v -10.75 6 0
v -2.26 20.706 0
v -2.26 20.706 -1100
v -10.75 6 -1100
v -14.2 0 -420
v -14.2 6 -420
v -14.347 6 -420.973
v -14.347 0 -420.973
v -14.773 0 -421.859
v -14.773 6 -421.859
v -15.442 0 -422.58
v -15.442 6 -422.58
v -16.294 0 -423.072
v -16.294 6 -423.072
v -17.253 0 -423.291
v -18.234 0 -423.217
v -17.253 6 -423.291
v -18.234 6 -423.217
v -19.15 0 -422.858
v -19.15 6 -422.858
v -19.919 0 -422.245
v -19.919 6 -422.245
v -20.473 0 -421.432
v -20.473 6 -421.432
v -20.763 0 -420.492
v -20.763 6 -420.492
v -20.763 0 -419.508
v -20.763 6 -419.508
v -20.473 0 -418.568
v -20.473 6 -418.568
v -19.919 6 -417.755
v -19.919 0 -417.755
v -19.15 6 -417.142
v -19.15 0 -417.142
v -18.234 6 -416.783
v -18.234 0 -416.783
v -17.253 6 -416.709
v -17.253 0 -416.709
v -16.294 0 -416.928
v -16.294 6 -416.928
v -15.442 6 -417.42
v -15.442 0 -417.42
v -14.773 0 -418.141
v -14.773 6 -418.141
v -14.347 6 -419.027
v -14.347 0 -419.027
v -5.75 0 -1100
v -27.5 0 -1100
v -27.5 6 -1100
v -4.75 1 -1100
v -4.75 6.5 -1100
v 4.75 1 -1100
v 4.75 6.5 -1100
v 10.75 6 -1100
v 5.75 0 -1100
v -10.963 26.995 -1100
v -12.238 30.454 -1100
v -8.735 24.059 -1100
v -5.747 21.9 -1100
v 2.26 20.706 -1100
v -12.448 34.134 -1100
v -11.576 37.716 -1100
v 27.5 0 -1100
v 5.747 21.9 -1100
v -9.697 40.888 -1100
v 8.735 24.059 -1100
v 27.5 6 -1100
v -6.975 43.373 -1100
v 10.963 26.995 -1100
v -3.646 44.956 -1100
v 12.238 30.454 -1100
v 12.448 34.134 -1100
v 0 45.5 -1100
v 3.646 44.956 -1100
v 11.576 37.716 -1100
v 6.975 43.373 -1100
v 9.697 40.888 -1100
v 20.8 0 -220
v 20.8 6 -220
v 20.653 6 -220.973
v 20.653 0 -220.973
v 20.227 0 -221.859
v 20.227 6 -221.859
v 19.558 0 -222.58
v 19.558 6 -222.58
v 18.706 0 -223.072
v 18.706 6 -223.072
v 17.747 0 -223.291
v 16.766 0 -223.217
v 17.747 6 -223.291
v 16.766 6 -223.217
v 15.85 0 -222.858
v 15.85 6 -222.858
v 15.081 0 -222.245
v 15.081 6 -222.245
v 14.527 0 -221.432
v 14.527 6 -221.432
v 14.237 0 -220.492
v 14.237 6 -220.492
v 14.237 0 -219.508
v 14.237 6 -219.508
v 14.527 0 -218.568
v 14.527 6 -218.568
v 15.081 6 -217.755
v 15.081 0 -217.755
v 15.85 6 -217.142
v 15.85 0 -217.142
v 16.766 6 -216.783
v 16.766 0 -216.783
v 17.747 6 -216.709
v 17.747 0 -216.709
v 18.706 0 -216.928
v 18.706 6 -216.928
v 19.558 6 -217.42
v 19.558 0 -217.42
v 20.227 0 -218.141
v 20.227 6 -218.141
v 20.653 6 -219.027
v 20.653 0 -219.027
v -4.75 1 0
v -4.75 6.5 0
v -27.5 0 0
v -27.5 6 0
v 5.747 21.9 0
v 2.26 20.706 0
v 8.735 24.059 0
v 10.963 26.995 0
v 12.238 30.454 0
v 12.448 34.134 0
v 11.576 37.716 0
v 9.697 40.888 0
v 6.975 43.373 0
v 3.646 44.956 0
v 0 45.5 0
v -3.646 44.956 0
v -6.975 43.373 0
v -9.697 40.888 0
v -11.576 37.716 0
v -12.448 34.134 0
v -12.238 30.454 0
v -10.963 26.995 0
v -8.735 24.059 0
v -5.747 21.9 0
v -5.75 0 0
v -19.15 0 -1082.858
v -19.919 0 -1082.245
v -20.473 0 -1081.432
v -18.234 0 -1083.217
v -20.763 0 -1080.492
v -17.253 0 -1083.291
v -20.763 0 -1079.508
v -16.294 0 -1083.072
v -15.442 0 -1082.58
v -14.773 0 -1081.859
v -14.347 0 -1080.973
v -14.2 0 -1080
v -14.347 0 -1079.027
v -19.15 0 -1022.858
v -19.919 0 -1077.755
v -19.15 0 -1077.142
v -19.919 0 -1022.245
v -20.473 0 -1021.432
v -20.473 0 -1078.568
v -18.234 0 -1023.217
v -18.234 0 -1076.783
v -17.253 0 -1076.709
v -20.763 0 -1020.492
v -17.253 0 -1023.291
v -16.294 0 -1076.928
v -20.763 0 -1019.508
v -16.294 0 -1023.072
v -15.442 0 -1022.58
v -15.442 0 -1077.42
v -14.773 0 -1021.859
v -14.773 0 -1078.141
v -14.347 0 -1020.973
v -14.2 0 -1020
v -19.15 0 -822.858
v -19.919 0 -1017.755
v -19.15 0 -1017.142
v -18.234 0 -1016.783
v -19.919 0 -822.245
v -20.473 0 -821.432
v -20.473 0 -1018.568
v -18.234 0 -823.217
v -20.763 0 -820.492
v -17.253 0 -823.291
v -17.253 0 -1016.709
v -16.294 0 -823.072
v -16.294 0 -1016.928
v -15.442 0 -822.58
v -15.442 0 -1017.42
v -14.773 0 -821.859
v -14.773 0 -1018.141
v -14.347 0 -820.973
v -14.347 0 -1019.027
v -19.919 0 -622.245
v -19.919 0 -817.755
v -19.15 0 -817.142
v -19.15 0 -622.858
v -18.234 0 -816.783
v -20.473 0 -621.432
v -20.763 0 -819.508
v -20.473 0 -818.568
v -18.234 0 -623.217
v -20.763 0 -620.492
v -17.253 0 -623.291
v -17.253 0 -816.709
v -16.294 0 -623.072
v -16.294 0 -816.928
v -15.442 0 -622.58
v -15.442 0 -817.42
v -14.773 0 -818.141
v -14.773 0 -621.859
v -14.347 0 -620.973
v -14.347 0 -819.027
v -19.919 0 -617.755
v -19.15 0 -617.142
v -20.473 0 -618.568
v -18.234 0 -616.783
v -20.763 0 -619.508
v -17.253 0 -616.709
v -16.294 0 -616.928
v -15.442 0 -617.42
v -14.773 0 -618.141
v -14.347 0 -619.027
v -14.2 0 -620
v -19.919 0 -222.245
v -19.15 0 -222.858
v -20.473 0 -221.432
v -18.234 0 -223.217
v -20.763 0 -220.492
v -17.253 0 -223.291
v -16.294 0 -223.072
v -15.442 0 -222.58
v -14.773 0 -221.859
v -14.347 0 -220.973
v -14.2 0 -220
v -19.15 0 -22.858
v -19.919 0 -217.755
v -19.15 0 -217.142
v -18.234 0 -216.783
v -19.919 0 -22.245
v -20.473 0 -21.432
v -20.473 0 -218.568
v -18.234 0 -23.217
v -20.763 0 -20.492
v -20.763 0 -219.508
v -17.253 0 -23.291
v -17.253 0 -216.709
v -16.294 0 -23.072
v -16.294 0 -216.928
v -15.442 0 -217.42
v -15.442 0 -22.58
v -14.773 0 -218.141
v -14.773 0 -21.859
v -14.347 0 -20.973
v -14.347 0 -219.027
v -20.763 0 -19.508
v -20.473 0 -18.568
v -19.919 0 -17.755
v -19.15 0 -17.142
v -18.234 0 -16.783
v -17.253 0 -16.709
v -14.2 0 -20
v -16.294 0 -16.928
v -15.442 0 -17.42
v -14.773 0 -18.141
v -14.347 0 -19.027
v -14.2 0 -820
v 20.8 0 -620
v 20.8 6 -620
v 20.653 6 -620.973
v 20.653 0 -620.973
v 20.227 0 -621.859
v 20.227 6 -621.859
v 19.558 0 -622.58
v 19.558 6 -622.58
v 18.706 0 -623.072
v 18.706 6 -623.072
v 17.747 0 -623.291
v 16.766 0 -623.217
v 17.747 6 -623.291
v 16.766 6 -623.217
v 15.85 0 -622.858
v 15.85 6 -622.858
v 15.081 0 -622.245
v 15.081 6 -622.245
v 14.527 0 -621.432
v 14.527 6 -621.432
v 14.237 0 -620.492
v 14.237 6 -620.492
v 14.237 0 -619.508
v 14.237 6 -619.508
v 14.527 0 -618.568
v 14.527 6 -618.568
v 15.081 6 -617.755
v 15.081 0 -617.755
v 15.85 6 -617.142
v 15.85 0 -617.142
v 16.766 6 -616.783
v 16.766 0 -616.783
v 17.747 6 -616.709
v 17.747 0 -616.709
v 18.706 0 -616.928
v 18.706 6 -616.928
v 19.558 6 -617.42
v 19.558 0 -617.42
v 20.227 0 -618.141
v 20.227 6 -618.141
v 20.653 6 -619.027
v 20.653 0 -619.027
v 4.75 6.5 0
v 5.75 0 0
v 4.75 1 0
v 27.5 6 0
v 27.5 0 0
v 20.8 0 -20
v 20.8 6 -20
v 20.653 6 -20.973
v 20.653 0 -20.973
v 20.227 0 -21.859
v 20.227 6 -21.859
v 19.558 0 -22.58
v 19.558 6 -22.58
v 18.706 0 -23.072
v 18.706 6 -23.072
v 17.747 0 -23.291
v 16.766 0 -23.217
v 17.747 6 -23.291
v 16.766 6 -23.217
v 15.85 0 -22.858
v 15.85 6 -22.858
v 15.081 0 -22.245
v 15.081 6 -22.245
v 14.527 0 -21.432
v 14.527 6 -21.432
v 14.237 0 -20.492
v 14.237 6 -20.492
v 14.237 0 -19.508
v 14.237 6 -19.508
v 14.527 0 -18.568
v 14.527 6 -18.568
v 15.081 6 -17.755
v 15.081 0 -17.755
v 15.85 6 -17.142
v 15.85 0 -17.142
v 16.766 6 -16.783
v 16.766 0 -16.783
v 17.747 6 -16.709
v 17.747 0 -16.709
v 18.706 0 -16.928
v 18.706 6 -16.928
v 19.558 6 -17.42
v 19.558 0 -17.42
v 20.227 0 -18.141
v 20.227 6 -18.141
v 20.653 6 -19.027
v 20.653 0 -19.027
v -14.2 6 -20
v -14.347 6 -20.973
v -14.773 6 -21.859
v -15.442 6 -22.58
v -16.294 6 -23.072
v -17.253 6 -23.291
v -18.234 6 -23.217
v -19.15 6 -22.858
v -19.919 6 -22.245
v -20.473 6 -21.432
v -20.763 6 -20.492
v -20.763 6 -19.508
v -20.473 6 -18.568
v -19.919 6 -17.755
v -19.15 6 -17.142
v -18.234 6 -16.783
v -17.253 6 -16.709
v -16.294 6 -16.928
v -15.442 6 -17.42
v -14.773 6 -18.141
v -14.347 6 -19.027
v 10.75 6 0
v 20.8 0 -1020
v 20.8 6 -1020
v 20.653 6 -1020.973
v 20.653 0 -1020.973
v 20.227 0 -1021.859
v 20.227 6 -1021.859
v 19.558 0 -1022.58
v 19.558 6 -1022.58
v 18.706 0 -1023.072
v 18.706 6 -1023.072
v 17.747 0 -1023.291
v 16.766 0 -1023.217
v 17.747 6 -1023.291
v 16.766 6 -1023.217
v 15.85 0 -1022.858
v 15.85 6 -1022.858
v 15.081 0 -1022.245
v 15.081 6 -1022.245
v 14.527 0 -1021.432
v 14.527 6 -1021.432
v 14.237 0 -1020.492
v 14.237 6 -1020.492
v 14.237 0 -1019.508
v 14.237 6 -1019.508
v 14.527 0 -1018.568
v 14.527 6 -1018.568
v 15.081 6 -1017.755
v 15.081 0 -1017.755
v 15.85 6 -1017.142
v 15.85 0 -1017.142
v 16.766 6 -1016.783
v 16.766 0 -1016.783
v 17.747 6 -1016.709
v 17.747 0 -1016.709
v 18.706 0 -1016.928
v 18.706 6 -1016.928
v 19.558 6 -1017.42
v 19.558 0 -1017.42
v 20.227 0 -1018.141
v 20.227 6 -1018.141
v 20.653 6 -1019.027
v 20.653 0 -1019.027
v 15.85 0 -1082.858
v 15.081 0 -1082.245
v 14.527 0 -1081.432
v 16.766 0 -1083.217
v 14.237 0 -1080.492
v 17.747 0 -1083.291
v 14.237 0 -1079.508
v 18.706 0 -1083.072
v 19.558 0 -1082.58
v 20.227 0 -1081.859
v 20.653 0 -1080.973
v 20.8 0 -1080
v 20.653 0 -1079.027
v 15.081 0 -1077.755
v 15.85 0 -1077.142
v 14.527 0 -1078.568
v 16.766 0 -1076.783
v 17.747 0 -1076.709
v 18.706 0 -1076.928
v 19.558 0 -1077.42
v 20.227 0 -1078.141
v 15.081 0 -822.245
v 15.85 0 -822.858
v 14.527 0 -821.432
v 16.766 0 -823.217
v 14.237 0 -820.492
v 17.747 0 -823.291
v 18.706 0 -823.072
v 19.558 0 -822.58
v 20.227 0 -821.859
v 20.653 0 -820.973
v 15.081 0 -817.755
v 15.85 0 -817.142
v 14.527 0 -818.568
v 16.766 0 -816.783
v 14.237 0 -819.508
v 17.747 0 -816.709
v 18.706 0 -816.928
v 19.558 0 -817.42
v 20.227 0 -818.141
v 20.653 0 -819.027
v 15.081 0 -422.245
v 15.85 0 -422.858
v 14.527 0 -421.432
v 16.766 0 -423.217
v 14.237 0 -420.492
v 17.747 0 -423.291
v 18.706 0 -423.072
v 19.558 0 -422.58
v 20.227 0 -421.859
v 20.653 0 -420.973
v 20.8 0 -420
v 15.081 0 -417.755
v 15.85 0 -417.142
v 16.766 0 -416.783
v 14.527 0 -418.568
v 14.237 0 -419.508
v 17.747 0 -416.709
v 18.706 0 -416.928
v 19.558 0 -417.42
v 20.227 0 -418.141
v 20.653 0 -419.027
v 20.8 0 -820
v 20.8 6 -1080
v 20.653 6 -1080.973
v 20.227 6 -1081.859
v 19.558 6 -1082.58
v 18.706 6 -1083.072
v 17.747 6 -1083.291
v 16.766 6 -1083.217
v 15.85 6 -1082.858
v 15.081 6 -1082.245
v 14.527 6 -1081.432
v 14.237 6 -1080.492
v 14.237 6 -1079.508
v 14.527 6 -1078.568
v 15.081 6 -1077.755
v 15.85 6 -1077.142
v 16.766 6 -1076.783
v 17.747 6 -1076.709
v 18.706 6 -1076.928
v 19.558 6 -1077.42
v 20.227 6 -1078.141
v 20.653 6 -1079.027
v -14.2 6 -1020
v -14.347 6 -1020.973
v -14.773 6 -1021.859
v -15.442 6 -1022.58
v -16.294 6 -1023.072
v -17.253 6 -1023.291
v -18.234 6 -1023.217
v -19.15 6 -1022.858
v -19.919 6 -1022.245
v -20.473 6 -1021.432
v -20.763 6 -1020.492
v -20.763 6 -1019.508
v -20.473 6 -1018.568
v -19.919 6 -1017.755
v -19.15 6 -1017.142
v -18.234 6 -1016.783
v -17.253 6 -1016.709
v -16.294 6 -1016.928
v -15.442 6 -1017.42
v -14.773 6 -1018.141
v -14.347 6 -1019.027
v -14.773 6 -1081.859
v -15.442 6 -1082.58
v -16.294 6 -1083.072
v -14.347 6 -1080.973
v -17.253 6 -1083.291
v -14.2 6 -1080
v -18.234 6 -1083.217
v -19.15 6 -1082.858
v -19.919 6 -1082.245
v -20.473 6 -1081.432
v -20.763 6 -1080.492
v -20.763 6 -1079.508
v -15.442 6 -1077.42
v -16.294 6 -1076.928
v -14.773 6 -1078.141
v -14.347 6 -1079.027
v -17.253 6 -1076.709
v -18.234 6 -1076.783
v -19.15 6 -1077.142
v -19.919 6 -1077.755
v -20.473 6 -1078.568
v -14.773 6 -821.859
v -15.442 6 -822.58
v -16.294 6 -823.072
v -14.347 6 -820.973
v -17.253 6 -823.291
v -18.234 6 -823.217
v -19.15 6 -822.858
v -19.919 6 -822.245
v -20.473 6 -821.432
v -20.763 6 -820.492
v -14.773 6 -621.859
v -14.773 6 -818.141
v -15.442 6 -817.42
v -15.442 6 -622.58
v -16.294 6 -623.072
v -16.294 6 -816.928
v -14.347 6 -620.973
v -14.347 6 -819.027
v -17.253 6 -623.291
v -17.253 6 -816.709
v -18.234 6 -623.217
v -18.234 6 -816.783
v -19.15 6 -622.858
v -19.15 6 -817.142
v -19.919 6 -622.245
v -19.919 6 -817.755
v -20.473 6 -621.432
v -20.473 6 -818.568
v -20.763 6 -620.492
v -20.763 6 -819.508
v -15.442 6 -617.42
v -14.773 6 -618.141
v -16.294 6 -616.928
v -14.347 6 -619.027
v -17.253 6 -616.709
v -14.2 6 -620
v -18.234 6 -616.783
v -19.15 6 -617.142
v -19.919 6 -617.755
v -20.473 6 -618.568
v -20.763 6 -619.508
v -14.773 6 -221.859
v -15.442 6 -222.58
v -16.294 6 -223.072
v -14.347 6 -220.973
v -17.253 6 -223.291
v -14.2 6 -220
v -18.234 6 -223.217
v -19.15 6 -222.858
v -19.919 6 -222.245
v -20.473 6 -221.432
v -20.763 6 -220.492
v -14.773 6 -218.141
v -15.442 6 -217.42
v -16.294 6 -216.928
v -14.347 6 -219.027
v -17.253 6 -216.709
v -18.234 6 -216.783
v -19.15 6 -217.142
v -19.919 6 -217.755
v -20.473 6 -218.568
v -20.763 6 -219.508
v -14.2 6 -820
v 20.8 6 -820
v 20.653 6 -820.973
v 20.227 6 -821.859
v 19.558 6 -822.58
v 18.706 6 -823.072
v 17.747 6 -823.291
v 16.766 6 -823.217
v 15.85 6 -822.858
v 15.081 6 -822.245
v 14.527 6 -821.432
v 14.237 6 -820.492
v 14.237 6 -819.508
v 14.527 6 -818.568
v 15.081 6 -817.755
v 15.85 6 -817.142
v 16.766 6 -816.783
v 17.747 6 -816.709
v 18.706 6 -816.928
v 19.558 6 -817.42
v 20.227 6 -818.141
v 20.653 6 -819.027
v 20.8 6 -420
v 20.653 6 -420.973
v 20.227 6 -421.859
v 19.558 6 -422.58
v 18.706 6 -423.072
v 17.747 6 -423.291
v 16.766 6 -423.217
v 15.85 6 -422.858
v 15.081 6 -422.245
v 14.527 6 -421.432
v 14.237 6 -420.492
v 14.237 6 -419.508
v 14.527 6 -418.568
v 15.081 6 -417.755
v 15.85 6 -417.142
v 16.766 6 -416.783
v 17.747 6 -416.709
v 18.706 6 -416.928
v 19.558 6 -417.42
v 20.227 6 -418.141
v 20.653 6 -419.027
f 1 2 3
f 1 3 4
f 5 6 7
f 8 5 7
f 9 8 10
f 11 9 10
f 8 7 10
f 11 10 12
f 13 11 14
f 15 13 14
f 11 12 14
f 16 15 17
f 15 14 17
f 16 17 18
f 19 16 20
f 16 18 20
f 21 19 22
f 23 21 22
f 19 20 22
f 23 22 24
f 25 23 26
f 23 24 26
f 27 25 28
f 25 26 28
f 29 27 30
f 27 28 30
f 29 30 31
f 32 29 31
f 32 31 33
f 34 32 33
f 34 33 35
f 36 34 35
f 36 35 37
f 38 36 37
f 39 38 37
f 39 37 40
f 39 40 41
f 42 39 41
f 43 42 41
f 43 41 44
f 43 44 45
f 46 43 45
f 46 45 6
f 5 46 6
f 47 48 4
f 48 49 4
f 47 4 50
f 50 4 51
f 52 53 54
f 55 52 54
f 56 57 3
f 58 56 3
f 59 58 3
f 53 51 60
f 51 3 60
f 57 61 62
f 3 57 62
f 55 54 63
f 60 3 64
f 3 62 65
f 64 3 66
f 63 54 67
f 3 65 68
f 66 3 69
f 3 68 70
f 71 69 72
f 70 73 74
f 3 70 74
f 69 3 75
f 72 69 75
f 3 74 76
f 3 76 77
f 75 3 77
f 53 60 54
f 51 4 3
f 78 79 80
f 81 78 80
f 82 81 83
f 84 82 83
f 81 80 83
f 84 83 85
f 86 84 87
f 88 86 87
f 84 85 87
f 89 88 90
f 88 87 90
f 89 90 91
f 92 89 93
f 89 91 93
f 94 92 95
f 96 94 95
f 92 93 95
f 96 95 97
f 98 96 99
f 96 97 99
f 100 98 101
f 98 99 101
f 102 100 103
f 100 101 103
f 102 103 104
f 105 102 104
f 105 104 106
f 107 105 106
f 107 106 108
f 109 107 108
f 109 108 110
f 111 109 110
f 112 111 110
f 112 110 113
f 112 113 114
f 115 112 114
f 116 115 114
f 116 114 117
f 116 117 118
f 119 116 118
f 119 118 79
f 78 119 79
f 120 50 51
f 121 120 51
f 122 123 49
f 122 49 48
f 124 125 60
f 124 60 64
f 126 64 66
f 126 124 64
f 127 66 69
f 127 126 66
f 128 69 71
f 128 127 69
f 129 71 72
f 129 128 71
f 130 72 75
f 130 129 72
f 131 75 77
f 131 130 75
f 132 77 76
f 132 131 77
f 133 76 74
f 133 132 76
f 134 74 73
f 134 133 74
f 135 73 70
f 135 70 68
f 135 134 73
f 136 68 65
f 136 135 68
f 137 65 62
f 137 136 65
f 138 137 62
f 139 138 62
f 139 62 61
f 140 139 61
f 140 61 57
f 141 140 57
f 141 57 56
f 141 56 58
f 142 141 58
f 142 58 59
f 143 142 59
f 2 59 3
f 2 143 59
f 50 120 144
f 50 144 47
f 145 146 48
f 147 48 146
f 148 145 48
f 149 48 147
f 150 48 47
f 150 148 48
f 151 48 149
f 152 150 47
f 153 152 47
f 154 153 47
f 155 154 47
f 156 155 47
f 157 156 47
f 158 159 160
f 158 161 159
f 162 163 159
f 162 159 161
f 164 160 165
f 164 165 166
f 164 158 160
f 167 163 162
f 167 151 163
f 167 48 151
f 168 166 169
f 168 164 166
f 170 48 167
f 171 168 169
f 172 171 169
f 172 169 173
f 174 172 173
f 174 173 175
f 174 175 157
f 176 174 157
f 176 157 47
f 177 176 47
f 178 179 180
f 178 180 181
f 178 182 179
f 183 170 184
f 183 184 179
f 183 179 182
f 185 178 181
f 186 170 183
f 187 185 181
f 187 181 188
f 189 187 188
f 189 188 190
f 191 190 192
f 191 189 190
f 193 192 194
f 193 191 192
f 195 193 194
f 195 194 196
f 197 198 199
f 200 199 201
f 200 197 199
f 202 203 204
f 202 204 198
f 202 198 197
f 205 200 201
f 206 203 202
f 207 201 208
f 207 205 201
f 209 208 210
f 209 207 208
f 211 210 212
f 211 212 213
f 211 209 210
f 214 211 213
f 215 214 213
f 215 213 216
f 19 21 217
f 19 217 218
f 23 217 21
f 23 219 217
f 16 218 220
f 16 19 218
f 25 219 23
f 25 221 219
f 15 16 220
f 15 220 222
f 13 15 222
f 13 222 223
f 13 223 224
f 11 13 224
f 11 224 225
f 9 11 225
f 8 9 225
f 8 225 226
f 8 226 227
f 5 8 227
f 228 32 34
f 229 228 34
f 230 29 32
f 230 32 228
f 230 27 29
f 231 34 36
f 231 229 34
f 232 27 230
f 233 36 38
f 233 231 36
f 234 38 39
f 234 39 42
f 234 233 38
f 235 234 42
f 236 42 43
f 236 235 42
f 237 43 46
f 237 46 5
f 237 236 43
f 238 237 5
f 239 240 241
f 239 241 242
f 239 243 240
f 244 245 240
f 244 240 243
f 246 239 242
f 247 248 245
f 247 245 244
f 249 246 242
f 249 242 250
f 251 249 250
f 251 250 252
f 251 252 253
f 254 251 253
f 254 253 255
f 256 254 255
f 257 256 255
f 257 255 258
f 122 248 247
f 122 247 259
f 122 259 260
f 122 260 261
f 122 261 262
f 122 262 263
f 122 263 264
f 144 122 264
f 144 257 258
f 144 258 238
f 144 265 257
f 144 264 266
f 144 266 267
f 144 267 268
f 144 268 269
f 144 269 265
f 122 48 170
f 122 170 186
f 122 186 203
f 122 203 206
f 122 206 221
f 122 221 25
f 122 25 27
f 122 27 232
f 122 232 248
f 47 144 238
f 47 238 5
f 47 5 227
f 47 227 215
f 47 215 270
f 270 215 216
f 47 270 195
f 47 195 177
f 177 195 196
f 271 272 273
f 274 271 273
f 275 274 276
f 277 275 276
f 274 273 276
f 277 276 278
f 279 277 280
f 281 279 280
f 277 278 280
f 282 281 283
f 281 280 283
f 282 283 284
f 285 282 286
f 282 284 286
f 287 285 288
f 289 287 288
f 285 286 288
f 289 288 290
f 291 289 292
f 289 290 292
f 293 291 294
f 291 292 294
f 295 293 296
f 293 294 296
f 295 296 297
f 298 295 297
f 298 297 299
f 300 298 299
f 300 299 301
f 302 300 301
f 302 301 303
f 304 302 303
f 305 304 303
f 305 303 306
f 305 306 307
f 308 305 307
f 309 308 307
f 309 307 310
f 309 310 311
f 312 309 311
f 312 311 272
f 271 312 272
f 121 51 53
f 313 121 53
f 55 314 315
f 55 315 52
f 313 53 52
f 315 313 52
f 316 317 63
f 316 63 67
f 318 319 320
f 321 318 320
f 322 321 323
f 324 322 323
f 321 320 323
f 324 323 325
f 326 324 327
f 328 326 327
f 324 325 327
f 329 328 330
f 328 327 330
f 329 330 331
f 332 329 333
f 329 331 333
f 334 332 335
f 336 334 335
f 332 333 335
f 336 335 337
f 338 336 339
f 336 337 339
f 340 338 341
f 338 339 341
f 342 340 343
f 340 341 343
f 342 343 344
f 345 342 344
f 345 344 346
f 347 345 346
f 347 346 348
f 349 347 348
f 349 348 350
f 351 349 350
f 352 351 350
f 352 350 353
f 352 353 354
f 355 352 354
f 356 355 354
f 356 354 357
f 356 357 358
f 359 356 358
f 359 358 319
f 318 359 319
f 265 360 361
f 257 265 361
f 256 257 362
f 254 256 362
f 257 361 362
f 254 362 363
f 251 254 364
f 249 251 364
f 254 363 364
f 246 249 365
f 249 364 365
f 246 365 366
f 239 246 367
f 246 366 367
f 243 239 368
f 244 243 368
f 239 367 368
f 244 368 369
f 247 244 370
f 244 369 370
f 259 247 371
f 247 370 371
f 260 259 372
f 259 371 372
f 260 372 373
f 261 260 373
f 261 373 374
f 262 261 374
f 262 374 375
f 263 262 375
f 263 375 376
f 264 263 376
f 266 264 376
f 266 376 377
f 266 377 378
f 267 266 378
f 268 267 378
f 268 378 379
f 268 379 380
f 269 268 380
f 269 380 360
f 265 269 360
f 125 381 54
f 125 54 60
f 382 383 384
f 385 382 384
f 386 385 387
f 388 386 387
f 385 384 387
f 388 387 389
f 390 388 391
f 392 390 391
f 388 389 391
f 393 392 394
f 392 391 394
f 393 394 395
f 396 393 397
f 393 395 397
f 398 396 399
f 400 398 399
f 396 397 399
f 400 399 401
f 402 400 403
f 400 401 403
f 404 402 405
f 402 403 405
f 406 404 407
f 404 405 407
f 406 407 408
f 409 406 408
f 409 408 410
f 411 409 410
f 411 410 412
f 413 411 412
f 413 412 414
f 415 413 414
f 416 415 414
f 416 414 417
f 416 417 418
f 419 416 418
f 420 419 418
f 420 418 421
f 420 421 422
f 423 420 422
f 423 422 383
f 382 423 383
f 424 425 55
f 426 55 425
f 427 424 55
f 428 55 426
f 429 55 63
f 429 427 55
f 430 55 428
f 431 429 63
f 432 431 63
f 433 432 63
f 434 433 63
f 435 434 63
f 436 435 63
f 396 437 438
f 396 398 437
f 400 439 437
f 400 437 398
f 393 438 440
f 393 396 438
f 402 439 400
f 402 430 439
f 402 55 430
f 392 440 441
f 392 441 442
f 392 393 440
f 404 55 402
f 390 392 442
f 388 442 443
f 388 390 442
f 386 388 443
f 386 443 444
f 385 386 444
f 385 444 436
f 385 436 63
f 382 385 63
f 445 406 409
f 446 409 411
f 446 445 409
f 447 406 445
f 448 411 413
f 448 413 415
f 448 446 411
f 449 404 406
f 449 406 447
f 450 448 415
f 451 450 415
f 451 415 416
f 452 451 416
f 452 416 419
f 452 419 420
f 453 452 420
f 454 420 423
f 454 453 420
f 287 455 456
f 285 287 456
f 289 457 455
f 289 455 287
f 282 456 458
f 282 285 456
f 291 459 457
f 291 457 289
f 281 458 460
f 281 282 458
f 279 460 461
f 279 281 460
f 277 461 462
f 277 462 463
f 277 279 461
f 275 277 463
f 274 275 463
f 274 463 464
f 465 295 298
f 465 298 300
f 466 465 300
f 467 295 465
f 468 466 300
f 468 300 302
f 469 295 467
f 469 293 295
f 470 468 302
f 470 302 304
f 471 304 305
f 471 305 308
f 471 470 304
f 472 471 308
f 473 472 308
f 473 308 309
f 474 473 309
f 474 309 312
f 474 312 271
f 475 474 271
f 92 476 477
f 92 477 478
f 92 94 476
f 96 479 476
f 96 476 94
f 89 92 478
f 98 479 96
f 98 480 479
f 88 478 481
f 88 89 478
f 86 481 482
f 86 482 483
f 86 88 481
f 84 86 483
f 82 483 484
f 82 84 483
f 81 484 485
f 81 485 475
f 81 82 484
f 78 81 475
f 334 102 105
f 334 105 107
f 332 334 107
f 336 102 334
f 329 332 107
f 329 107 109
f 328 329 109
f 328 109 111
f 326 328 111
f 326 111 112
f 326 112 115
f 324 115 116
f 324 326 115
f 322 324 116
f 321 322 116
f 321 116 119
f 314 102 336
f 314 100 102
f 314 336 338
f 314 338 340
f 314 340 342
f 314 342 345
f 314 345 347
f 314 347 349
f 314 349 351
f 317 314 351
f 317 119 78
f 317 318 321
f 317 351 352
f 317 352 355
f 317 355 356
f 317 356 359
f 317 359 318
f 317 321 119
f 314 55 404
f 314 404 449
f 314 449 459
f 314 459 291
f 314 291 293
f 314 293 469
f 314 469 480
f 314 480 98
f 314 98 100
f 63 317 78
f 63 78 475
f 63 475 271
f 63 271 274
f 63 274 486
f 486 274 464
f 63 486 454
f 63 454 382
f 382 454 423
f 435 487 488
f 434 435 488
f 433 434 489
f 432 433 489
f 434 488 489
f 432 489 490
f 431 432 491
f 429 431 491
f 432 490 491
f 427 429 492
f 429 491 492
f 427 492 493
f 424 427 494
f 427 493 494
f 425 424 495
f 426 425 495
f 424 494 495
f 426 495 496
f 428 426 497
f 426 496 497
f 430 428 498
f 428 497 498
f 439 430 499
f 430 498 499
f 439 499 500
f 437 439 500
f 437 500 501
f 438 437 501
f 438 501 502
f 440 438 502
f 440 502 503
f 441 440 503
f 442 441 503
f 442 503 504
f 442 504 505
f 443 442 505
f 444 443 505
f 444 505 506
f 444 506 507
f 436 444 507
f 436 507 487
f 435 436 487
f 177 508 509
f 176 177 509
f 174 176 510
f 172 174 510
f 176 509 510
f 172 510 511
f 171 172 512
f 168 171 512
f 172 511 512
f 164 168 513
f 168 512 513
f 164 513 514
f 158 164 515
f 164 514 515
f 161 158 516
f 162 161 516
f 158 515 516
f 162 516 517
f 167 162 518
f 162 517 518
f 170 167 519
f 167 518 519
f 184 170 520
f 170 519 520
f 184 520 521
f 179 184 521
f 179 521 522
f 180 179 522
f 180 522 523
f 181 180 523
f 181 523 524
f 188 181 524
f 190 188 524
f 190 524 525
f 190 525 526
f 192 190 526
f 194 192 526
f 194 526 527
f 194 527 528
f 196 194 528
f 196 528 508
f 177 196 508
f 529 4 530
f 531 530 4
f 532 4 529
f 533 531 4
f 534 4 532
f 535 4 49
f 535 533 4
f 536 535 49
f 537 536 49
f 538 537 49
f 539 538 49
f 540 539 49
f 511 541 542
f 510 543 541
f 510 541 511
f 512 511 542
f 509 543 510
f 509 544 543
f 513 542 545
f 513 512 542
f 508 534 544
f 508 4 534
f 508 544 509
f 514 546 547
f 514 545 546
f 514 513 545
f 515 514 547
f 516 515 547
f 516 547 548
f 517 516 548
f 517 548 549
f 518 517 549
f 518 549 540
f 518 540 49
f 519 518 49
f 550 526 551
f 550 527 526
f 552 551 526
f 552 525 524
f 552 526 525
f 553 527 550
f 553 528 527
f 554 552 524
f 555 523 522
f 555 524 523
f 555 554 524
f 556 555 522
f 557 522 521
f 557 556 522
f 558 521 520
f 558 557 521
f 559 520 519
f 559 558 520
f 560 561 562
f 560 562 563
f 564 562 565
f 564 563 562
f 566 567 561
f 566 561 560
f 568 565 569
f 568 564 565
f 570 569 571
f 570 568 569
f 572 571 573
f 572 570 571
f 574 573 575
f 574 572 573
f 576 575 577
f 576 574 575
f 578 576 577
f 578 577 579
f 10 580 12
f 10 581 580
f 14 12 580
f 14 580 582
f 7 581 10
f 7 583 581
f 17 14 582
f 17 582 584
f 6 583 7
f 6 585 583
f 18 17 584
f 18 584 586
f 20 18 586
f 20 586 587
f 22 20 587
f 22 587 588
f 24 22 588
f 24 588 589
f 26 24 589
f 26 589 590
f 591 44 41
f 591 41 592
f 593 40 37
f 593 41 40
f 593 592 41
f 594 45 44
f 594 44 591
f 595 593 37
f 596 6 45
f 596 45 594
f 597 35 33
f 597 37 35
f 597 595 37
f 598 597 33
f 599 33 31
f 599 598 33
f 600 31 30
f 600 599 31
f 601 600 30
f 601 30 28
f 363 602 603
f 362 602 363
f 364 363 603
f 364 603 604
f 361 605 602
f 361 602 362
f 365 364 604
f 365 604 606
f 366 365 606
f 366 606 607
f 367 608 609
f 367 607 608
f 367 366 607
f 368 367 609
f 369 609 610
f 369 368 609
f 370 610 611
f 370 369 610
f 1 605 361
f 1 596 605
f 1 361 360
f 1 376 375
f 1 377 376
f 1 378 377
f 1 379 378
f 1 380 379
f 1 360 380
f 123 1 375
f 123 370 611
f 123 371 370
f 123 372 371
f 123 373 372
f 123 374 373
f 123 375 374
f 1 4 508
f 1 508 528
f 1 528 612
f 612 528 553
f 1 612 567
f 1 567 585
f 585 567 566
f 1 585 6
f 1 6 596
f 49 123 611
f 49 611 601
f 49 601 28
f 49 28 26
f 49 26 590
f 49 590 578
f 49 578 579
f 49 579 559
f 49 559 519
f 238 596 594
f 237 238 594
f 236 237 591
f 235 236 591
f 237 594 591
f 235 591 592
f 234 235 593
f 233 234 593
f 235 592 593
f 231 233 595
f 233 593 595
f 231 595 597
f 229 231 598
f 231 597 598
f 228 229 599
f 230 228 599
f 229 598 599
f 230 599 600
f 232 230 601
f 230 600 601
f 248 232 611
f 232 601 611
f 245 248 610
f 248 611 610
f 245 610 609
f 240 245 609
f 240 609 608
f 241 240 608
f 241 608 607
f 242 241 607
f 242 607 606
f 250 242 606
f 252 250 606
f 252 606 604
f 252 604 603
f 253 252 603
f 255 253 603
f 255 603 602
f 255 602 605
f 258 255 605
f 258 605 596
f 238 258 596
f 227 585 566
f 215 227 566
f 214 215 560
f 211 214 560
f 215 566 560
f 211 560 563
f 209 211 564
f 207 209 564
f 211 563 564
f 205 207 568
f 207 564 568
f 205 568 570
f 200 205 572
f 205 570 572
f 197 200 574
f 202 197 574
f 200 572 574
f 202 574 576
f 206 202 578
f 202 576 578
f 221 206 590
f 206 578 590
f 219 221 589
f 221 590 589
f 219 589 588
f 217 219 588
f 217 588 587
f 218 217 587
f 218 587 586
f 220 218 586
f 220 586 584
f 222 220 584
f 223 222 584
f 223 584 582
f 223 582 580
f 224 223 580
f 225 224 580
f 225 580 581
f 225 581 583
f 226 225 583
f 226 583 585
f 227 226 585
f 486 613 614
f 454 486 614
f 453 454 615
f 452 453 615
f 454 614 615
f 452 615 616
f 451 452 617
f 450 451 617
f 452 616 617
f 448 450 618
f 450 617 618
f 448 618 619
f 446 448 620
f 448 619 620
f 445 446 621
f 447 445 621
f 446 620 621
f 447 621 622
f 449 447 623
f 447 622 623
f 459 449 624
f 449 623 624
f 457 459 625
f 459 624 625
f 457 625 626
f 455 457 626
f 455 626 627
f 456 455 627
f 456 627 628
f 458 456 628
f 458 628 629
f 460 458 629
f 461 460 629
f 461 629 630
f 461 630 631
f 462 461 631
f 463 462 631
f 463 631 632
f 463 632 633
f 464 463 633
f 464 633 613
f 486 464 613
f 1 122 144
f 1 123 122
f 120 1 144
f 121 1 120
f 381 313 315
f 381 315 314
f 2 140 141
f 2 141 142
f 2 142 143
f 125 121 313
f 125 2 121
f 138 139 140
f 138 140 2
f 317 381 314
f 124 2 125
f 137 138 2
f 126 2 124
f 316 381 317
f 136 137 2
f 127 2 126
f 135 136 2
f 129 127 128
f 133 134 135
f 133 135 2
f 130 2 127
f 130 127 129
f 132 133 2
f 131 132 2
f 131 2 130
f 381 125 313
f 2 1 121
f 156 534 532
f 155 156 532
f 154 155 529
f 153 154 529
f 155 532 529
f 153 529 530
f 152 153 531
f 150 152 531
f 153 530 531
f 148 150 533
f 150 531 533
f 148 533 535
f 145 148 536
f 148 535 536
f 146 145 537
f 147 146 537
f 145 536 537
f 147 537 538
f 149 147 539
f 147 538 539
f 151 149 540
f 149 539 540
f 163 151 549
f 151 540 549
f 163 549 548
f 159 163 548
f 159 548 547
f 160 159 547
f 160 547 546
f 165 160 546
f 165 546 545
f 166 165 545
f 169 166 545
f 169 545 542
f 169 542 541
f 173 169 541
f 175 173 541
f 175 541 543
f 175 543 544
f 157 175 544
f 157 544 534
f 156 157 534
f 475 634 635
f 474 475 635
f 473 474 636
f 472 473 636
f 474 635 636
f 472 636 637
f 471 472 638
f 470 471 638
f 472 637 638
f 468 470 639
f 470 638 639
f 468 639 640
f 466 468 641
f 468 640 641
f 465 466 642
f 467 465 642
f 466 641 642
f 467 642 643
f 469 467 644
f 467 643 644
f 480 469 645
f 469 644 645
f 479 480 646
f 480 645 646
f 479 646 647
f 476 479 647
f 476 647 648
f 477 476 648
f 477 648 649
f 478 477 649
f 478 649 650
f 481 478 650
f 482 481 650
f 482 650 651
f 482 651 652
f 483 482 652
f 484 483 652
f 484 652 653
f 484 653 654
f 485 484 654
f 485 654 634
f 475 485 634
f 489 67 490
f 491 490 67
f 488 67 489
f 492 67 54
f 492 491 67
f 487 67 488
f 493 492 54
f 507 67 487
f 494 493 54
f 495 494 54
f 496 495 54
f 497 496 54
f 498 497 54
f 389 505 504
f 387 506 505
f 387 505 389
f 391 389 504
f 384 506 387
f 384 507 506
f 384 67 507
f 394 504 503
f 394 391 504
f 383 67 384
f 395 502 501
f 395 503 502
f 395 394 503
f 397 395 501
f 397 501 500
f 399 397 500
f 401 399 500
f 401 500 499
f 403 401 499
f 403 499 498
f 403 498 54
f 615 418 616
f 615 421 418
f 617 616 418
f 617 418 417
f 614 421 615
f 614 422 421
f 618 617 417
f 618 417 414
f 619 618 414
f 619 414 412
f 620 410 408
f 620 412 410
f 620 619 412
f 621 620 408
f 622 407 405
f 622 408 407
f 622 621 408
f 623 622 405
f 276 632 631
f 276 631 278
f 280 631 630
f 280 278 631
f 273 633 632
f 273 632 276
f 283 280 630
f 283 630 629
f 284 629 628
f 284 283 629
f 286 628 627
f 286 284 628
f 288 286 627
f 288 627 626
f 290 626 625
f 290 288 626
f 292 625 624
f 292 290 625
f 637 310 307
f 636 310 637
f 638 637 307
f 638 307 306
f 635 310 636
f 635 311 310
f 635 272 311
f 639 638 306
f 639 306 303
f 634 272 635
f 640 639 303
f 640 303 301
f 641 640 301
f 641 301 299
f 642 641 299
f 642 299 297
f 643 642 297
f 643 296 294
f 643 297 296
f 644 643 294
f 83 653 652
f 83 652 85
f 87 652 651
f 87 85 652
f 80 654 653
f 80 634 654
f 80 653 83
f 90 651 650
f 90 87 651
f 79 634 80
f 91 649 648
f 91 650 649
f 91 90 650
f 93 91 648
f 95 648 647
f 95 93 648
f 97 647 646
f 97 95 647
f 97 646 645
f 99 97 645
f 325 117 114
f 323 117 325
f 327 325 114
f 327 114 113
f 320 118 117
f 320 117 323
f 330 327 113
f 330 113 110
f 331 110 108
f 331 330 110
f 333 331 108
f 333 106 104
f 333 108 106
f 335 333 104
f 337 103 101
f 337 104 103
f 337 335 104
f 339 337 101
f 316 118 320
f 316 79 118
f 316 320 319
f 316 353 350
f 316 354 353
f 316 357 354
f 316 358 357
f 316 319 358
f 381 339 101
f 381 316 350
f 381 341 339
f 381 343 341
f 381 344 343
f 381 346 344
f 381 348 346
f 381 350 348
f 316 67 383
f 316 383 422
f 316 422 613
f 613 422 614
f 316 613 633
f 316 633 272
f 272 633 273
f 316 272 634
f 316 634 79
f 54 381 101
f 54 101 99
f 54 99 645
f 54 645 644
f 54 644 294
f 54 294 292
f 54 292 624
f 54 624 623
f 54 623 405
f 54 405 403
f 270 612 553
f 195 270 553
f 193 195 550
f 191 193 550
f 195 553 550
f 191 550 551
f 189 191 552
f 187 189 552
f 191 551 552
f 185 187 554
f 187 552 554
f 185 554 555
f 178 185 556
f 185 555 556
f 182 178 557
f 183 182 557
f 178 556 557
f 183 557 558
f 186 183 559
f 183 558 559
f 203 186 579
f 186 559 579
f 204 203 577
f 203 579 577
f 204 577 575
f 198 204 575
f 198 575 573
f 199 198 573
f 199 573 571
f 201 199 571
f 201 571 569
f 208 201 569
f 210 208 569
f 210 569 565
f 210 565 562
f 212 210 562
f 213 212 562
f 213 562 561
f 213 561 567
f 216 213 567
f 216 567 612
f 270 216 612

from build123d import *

# Parameters (mm, degrees)
SKETCH1_R               = 12.5
BOSS_EXTRUDE1_DEPTH     = 1100
CHAMFER1_SIZE           = 1
SKETCH2_R               = 3.3
CUT_EXTRUDE1_DEPTH      = 40.5
CUT_EXTRUDE1_DEPTH_BACK = 7


with BuildPart() as part:
    # Sketch1 → Boss-Extrude1 (new body)
    with BuildSketch(Plane.XY):
        with Locations((0, 33)):
            Circle(SKETCH1_R)
        Polygon((-27.5, 0), (-4.75, 0), (-4.75, 6.5), (4.75, 6.5), (4.75, 0), (27.5, 0), (27.5, 6), (10.75, 6), (2.089745962, 21), (-2.089745962, 21), (-10.75, 6), (-27.5, 6), align=None)
    extrude(amount=-BOSS_EXTRUDE1_DEPTH)

    # Chamfer1
    chamfer1_edges = [part.edges().sort_by_distance(p)[0] for p in [
        (4.75, 0, -550),
        (-4.75, 0, -550),
    ]]
    chamfer(chamfer1_edges, length=CHAMFER1_SIZE)

    # Sketch2 → Cut-Extrude1 (cut, two sides)
    with BuildSketch(Plane(origin=(0, 6, 0), x_dir=(1, 0, 0), z_dir=(0, 1, 0))) as cut_extrude1_sk:
        with Locations((17.5, 20)):
            Circle(SKETCH2_R)
        with Locations((-17.5, 20)):
            Circle(SKETCH2_R)
        with Locations((-17.5, 220)):
            Circle(SKETCH2_R)
        with Locations((17.5, 220)):
            Circle(SKETCH2_R)
        with Locations((-17.5, 420)):
            Circle(SKETCH2_R)
        with Locations((17.5, 420)):
            Circle(SKETCH2_R)
        with Locations((-17.5, 620)):
            Circle(SKETCH2_R)
        with Locations((17.5, 620)):
            Circle(SKETCH2_R)
        with Locations((-17.5, 820)):
            Circle(SKETCH2_R)
        with Locations((17.5, 820)):
            Circle(SKETCH2_R)
        with Locations((-17.5, 1020)):
            Circle(SKETCH2_R)
        with Locations((17.5, 1020)):
            Circle(SKETCH2_R)
        with Locations((-17.5, 1220)):
            Circle(SKETCH2_R)
        with Locations((17.5, 1220)):
            Circle(SKETCH2_R)
        with Locations((-17.5, 1420)):
            Circle(SKETCH2_R)
        with Locations((17.5, 1420)):
            Circle(SKETCH2_R)
        with Locations((-17.5, 1620)):
            Circle(SKETCH2_R)
        with Locations((17.5, 1620)):
            Circle(SKETCH2_R)
        with Locations((17.5, 1080)):
            Circle(SKETCH2_R)
        with Locations((-17.5, 1080)):
            Circle(SKETCH2_R)
    extrude(amount=CUT_EXTRUDE1_DEPTH, mode=Mode.SUBTRACT)
    extrude(cut_extrude1_sk.sketch, amount=-CUT_EXTRUDE1_DEPTH_BACK, mode=Mode.SUBTRACT)


solid = part.part
